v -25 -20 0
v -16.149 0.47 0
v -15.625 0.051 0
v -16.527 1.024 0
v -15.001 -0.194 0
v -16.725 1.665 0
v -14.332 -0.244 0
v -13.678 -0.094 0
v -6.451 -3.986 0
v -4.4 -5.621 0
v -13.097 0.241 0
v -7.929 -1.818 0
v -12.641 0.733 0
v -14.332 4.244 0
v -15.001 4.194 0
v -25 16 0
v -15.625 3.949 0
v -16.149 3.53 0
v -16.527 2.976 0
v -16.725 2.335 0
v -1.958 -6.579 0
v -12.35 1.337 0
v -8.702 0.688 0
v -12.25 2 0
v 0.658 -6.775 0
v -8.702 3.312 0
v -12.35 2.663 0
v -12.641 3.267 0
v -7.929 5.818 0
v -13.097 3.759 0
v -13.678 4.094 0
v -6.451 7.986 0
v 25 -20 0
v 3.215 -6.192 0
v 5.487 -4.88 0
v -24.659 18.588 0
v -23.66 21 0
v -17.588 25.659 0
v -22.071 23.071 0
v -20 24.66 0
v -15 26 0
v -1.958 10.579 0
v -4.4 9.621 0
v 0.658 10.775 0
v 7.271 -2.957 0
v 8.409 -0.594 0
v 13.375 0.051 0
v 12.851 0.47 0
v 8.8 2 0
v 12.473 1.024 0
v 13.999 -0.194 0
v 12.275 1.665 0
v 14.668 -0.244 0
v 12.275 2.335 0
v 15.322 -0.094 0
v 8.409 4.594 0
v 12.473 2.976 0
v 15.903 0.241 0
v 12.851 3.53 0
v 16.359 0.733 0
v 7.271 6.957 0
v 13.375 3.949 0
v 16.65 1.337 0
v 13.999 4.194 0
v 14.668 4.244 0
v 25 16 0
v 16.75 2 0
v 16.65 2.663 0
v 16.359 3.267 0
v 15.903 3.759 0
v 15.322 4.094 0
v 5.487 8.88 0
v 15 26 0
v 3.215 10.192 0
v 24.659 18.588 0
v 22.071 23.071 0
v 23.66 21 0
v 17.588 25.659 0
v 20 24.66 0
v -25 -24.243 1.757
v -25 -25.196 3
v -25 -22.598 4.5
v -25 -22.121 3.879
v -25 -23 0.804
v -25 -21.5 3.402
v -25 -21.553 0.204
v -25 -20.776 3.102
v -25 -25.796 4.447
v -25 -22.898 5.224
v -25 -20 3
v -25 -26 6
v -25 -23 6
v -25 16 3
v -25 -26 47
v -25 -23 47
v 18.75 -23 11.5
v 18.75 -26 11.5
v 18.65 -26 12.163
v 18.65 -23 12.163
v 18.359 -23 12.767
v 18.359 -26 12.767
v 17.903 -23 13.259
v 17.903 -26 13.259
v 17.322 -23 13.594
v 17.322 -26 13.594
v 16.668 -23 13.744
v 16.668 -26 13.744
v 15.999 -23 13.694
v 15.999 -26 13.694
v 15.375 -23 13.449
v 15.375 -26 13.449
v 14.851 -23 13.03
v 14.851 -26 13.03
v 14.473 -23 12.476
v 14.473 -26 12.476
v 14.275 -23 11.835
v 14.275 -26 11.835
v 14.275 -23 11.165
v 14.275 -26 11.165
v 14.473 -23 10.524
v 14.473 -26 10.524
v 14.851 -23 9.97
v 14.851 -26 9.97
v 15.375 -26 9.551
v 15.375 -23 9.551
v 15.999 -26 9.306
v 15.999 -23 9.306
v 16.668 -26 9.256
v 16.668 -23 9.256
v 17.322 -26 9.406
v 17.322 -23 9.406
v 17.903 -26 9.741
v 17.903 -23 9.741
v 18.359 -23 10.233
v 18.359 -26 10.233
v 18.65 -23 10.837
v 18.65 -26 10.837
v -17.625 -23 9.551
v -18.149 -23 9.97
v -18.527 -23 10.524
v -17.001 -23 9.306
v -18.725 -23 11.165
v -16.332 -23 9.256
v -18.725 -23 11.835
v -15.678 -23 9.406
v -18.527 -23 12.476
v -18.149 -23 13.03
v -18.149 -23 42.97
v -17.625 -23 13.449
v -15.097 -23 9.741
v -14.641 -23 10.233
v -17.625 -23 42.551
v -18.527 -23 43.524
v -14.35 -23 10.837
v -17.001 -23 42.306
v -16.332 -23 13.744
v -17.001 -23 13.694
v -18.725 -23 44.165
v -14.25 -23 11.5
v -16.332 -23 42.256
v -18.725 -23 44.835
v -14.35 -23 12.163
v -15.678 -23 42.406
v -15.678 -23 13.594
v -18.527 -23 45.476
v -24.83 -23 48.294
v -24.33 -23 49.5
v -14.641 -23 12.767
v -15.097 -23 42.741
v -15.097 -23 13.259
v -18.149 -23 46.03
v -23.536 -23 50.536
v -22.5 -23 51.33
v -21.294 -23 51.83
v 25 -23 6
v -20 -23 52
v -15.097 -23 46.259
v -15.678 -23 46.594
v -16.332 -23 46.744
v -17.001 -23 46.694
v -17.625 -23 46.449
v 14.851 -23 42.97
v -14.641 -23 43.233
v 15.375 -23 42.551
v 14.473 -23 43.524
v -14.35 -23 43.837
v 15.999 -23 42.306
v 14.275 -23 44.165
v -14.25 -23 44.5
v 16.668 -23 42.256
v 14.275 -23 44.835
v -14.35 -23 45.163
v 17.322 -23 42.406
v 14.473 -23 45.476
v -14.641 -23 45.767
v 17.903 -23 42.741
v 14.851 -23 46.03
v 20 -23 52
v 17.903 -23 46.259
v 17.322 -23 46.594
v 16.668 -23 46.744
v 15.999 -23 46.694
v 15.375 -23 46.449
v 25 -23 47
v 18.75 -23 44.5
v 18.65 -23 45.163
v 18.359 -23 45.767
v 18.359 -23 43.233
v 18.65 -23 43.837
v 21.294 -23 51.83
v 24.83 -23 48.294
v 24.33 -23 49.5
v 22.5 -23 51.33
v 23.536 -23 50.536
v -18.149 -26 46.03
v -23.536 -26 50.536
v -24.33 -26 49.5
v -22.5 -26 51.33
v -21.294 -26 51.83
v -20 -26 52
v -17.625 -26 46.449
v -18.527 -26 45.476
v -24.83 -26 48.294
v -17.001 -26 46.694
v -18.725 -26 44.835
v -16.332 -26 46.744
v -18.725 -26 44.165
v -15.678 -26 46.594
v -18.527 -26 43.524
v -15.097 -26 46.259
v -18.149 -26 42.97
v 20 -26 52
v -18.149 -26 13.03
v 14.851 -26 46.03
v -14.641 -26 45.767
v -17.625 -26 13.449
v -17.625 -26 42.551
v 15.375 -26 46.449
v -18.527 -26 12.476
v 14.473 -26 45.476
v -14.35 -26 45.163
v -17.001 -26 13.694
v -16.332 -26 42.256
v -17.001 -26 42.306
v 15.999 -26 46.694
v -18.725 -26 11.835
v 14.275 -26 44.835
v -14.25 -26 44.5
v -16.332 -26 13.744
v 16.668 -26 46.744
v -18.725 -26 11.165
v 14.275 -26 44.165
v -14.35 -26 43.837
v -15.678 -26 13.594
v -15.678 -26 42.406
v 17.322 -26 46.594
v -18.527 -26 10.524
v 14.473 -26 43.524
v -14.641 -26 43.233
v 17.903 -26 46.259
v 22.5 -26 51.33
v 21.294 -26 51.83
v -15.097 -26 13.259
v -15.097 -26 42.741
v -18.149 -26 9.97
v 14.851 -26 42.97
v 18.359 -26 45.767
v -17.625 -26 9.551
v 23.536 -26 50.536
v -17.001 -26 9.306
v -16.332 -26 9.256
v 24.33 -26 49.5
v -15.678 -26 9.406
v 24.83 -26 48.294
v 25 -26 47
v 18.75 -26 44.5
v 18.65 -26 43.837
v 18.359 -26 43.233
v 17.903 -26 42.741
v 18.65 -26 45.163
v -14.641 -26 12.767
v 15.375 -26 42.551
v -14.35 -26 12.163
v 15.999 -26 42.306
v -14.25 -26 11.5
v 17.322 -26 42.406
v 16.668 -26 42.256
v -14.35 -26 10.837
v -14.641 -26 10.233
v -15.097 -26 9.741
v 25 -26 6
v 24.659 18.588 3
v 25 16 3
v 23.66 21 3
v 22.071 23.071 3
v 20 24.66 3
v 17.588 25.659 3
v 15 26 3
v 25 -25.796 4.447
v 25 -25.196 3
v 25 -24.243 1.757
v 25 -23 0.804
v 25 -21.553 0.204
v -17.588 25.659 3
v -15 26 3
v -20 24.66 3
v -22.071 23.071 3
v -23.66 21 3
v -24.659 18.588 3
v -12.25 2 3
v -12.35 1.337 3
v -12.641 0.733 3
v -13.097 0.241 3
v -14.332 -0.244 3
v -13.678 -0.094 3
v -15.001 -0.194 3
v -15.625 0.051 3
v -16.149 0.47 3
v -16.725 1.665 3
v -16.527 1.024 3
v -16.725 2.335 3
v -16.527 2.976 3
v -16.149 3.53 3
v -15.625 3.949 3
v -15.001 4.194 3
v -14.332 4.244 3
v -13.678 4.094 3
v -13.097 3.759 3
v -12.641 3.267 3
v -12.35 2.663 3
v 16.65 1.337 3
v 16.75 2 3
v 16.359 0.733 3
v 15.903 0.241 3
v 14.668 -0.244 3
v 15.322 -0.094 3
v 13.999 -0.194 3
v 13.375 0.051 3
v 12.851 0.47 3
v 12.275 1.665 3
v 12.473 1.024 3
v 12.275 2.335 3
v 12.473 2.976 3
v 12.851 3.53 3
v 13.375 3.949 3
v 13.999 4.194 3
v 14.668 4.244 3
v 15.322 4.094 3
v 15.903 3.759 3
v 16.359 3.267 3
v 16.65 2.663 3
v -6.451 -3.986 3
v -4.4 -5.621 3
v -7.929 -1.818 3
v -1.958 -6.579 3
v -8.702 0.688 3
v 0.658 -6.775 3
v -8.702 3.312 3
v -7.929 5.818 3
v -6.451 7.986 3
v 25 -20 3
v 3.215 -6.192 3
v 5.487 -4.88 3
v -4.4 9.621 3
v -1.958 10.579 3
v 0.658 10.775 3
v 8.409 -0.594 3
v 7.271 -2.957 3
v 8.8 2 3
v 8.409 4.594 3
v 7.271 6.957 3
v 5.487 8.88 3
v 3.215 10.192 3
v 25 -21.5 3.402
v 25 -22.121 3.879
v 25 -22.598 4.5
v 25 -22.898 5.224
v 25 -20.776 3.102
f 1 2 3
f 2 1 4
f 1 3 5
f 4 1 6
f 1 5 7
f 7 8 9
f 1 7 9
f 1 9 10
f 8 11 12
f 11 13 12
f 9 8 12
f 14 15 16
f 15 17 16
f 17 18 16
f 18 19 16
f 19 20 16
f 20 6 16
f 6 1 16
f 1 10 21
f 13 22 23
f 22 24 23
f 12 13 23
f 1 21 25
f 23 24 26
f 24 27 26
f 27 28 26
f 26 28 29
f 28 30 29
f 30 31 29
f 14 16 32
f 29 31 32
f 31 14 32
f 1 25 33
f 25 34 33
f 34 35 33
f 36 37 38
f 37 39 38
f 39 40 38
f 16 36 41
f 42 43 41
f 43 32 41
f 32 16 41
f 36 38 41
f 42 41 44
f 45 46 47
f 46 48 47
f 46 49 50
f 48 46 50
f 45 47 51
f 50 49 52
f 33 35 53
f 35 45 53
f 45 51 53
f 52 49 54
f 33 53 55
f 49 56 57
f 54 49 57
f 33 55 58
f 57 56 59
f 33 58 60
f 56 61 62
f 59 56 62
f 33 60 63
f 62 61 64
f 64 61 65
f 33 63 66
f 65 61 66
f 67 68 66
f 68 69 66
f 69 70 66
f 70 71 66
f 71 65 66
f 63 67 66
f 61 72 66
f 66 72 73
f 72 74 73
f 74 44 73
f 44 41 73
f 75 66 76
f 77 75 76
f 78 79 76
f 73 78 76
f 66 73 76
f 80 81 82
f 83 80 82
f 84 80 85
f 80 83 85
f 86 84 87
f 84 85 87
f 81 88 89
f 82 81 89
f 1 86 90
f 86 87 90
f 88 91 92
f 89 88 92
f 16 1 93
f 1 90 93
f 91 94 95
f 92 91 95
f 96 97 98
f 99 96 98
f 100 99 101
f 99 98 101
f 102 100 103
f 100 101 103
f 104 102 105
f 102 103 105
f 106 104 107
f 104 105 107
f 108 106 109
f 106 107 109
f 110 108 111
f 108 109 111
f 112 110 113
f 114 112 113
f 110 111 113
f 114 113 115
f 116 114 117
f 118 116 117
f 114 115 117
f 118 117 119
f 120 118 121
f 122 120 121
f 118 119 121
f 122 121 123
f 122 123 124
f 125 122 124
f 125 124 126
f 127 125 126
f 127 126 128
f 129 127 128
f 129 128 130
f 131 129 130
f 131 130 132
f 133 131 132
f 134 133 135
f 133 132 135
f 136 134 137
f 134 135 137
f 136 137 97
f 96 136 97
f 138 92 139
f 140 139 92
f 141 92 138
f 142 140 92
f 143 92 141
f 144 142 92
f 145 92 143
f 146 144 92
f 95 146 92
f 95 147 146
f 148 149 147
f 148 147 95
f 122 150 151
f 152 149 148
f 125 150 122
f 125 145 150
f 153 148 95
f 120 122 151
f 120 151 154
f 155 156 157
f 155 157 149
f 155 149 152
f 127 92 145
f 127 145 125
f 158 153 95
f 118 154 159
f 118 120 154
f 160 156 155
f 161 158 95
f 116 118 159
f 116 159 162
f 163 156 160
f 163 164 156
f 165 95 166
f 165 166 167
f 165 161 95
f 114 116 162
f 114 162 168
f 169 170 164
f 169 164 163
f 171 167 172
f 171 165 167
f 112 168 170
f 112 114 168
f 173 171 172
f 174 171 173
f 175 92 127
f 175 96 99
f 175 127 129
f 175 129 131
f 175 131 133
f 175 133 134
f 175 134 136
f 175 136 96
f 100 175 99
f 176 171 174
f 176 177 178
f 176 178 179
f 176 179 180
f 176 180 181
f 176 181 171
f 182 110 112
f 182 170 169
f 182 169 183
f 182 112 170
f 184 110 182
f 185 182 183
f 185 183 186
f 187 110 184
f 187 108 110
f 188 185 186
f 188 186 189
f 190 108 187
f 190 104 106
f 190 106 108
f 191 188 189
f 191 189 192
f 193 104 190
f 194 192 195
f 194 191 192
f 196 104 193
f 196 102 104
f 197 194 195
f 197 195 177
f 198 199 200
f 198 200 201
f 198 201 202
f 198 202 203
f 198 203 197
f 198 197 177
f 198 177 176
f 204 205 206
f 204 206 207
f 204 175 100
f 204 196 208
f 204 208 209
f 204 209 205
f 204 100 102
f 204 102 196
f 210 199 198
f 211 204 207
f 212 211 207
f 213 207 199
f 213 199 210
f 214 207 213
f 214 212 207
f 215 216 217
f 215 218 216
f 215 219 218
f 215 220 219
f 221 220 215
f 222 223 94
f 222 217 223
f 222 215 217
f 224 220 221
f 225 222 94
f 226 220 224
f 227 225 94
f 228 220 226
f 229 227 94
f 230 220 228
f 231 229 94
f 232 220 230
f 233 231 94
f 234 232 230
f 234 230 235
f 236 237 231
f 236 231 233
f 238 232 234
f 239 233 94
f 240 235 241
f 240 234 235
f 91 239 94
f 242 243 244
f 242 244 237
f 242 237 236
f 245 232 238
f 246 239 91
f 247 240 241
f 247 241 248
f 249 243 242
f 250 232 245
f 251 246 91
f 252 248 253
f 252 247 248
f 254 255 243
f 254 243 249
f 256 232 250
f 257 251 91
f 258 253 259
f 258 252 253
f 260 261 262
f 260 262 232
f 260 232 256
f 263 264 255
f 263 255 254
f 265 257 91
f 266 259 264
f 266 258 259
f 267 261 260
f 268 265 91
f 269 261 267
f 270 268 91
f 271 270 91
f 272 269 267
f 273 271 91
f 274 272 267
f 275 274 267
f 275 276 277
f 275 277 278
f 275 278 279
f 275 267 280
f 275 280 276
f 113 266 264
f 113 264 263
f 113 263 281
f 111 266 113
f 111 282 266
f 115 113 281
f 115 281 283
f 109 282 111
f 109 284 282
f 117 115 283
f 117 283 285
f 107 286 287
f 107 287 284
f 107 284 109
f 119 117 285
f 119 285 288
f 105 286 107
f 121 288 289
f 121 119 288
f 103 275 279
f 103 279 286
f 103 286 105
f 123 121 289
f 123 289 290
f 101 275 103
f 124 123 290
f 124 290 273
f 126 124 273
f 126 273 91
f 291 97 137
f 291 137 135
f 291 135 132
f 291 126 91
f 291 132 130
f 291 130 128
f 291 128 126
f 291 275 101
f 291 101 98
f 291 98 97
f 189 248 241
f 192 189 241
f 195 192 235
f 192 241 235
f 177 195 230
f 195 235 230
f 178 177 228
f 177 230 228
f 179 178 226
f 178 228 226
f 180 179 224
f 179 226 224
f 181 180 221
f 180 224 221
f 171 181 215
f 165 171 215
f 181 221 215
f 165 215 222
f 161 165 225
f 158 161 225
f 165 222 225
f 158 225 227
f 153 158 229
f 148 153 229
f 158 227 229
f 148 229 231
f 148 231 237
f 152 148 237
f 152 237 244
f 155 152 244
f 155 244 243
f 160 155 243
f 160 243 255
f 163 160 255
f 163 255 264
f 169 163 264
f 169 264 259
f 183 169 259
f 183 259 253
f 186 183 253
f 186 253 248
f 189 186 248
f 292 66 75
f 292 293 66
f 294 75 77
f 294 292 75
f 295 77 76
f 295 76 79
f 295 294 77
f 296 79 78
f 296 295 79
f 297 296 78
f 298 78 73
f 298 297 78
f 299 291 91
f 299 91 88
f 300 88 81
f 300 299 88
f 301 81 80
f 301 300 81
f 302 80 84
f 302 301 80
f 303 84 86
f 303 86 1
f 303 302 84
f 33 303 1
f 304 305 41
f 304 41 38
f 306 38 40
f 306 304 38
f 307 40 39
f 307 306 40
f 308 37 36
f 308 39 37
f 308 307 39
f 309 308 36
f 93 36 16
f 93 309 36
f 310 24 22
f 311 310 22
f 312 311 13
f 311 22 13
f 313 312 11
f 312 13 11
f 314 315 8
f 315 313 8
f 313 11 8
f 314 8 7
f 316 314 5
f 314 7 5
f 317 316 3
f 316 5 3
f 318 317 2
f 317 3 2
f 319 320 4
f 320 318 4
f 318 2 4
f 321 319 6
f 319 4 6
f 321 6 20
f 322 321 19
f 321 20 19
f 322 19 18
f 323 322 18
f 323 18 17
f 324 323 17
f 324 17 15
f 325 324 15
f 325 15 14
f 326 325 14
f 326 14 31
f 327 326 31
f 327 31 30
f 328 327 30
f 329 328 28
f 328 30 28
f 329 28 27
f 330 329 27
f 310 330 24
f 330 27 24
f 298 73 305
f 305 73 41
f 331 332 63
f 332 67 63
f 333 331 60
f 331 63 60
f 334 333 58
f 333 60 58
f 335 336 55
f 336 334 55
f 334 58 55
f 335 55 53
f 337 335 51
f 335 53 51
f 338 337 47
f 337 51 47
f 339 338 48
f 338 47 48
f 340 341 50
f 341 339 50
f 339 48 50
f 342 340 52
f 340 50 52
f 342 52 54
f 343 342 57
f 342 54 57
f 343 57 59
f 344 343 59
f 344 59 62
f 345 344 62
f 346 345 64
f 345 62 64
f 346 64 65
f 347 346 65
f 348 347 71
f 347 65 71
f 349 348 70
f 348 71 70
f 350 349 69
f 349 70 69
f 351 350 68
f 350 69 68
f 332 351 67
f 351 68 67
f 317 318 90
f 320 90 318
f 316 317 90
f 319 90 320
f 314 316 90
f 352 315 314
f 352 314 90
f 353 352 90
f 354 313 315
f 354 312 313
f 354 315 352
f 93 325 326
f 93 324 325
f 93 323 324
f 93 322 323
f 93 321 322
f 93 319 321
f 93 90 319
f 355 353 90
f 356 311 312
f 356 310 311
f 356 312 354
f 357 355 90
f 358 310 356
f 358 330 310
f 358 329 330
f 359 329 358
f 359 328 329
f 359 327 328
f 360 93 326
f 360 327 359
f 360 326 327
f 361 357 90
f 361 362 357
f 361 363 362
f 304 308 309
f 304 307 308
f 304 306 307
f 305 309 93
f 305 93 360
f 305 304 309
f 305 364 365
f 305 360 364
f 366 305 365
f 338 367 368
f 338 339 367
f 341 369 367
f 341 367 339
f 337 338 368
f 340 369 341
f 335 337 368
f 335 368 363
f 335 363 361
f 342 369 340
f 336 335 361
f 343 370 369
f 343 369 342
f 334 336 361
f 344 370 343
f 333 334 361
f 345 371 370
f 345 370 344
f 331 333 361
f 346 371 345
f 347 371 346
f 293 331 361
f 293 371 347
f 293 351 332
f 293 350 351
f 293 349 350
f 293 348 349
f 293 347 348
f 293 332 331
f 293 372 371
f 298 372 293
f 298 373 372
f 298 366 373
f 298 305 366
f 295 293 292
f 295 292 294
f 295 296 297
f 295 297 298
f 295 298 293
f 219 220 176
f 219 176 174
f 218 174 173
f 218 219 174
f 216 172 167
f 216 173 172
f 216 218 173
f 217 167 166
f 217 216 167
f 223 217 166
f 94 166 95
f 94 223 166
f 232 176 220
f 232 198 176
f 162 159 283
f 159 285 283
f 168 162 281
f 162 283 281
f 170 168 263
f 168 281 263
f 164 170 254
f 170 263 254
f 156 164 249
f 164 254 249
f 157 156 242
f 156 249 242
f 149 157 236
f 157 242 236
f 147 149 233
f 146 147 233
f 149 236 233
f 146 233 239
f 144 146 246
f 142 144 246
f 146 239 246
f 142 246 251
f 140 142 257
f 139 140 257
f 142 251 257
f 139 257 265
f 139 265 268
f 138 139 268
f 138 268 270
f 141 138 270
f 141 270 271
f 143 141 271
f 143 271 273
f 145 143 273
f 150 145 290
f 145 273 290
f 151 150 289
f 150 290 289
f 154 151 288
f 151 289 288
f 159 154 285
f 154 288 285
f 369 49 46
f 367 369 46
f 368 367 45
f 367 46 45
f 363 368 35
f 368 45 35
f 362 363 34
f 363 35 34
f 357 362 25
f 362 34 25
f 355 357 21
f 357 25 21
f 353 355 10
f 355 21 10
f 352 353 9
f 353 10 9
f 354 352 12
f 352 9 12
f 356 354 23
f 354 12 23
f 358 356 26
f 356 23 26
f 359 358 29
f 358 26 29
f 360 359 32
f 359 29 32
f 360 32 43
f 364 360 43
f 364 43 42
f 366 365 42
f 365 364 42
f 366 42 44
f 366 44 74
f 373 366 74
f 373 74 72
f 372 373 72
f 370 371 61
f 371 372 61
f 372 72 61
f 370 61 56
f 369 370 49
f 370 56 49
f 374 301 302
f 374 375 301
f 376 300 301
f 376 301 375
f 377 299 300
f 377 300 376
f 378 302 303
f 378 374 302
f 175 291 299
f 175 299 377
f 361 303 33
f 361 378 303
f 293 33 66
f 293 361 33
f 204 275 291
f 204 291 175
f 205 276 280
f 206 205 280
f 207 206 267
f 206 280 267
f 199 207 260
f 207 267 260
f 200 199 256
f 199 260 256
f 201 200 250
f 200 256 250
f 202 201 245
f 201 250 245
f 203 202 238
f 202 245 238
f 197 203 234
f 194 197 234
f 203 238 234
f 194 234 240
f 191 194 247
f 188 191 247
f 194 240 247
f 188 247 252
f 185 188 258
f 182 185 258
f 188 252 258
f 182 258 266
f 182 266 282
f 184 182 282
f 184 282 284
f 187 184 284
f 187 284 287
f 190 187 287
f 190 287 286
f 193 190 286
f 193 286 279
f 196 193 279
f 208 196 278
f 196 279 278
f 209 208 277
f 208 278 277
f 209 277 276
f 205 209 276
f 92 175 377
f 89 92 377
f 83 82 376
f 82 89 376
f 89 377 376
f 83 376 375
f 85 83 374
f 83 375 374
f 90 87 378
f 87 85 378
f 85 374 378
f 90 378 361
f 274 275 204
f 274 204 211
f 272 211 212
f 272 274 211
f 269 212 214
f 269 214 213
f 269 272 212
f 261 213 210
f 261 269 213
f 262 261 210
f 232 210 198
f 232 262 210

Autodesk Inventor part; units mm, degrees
ref_plane "YZ Plane" through (0, 0, 0) normal (1, 0, 0) x (0, 1, 0)
ref_plane "XZ Plane" through (0, 0, 0) normal (0, 1, 0) x (-1, 0, 0)
ref_plane "XY Plane" through (0, 0, 0) normal (0, 0, 1) x (1, 0, 0)
sketch "Sketch1" plane through (0, 0, 0) normal (0, 0, 1) x (1, 0, 0)
  line L0 (-25, -26) -> (25, -26)
  line L1 (25, -26) -> (25, 26)
  line L2 (25, 26) -> (-25, 26)
  line L3 (-25, 26) -> (-25, -26)
  line L4 (-25, -26) -> (25, 26) construction
  line L5 (25, -26) -> (-25, 26) construction
  circle A0 centre (0, 2) radius 8.8
  circle A1 centre (-14.5, 2) radius 2.25
  circle A2 centre (14.5, 2) radius 2.25
  point P0 (0, 0)
  dimension "d0" = 50
  dimension "d1" = 52
  dimension "d2" = 17.6
  dimension "d3" = 24
  dimension "d4" = 4.5
  dimension "d5" = 4.5
  dimension "d6" = 29
  dimension "d7" = 14.5
  dimension "d8" = 24
  dimension "d9" = 24
  dimension "d10" = 25
extrude "Plate1" add sketch "Sketch1" along normal blind 3
sketch "Sketch2" plane through (25, -23, 0) normal (0, -1, 0) x (1, 0, 0)
  line L0 (-50, 0) -> (0, 0)
  line L1 (0, 0) -> (0, 52)
  line L2 (0, 52) -> (-50, 52)
  line L3 (-50, 52) -> (-50, 0)
edge flange "Flange1" height 52 angle 90 thickness 3 bend radius 3 thickness toward (0, -1, 0) relief tear relief width 3 relief depth 1.5 edges at (0, -26, 3) wall of the first edge with corners at (-25, -23, 0) (25, -23, 0) (25, -23, 52) (-25, -23, 52)
bend "Bend1"
corner "Corner1"
fillet "Fillet1" radius 10 2 edges at (25, 26, 1.5) (-25, 26, 1.5)
fillet "Fillet2" radius 5 2 edges at (-25, -24.5, 52) (25, -24.5, 52)
sketch "Sketch3" plane through (-25, -26, 6) normal (0, -1, 0) x (1, 0, 0)
  line L0 (8.5, 38.5) -> (41.5, 38.5)
  line L1 (41.5, 38.5) -> (41.5, 5.5)
  line L2 (41.5, 5.5) -> (8.5, 5.5)
  line L3 (8.5, 5.5) -> (8.5, 38.5)
  line L4 (8.5, 38.5) -> (41.5, 5.5) construction
  line L5 (41.5, 38.5) -> (8.5, 5.5) construction
  line L6 (5, 46) -> (45, 46) projected
  line L7 (50, 41) -> (50, 0) projected
  circle A0 centre (41.5, 38.5) radius 2.25
  circle A1 centre (41.5, 5.5) radius 2.25
  circle A2 centre (8.5, 38.5) radius 2.25
  circle A3 centre (8.5, 5.5) radius 2.25
  point P0 (25, -6)
  point P1 (25, 22)
  dimension "d24" = 33
  dimension "d25" = 33
  dimension "d26" = 24
  dimension "d27" = 25
  dimension "d28" = 4.5
  dimension "d29" = 4.5
  dimension "d30" = 4.5
  dimension "d31" = 4.5
extrude "Cut1" cut sketch "Sketch3" against normal blind 3 contours L3 A2 L0 | L0 A2 L3 | A0 L1 L0 | L0 L1 A0 | A3 L2 L3 | L3 L2 A3 | A1 L2 L1 | L1 L2 A1
equation "\"d32\" = Thickness"
equation "\"d11\" = Thickness"
equation "\"d12\" = BendReliefWidth"
equation "\"d13\" = BendReliefDepth"
equation "\"d14\" = MinimumRemnant"
equation "\"d15\" = TransitionRadius"
equation "\"d18\" = BendRadius"
equation "\"d19\" = CornerReliefSize"
equation "\"d20\" = GapSize"
equation "\"d21\" = JacobiRadiusSize"
equation "\"BendRadius\" = Thickness"
equation "\"BendReliefWidth\" = Thickness"
equation "\"BendReliefDepth\" = 0.5 * Thickness"
equation "\"CornerReliefSize\" = 4 * Thickness"
equation "\"MinimumRemnant\" = 2 * Thickness"
equation "\"TransitionRadius\" = BendRadius"
equation "\"JacobiRadiusSize\" = BendRadius"
equation "\"GapSize\" = Thickness"
equation "\"Thickness\" = 3"
properties part number "Pad dong co 775"
